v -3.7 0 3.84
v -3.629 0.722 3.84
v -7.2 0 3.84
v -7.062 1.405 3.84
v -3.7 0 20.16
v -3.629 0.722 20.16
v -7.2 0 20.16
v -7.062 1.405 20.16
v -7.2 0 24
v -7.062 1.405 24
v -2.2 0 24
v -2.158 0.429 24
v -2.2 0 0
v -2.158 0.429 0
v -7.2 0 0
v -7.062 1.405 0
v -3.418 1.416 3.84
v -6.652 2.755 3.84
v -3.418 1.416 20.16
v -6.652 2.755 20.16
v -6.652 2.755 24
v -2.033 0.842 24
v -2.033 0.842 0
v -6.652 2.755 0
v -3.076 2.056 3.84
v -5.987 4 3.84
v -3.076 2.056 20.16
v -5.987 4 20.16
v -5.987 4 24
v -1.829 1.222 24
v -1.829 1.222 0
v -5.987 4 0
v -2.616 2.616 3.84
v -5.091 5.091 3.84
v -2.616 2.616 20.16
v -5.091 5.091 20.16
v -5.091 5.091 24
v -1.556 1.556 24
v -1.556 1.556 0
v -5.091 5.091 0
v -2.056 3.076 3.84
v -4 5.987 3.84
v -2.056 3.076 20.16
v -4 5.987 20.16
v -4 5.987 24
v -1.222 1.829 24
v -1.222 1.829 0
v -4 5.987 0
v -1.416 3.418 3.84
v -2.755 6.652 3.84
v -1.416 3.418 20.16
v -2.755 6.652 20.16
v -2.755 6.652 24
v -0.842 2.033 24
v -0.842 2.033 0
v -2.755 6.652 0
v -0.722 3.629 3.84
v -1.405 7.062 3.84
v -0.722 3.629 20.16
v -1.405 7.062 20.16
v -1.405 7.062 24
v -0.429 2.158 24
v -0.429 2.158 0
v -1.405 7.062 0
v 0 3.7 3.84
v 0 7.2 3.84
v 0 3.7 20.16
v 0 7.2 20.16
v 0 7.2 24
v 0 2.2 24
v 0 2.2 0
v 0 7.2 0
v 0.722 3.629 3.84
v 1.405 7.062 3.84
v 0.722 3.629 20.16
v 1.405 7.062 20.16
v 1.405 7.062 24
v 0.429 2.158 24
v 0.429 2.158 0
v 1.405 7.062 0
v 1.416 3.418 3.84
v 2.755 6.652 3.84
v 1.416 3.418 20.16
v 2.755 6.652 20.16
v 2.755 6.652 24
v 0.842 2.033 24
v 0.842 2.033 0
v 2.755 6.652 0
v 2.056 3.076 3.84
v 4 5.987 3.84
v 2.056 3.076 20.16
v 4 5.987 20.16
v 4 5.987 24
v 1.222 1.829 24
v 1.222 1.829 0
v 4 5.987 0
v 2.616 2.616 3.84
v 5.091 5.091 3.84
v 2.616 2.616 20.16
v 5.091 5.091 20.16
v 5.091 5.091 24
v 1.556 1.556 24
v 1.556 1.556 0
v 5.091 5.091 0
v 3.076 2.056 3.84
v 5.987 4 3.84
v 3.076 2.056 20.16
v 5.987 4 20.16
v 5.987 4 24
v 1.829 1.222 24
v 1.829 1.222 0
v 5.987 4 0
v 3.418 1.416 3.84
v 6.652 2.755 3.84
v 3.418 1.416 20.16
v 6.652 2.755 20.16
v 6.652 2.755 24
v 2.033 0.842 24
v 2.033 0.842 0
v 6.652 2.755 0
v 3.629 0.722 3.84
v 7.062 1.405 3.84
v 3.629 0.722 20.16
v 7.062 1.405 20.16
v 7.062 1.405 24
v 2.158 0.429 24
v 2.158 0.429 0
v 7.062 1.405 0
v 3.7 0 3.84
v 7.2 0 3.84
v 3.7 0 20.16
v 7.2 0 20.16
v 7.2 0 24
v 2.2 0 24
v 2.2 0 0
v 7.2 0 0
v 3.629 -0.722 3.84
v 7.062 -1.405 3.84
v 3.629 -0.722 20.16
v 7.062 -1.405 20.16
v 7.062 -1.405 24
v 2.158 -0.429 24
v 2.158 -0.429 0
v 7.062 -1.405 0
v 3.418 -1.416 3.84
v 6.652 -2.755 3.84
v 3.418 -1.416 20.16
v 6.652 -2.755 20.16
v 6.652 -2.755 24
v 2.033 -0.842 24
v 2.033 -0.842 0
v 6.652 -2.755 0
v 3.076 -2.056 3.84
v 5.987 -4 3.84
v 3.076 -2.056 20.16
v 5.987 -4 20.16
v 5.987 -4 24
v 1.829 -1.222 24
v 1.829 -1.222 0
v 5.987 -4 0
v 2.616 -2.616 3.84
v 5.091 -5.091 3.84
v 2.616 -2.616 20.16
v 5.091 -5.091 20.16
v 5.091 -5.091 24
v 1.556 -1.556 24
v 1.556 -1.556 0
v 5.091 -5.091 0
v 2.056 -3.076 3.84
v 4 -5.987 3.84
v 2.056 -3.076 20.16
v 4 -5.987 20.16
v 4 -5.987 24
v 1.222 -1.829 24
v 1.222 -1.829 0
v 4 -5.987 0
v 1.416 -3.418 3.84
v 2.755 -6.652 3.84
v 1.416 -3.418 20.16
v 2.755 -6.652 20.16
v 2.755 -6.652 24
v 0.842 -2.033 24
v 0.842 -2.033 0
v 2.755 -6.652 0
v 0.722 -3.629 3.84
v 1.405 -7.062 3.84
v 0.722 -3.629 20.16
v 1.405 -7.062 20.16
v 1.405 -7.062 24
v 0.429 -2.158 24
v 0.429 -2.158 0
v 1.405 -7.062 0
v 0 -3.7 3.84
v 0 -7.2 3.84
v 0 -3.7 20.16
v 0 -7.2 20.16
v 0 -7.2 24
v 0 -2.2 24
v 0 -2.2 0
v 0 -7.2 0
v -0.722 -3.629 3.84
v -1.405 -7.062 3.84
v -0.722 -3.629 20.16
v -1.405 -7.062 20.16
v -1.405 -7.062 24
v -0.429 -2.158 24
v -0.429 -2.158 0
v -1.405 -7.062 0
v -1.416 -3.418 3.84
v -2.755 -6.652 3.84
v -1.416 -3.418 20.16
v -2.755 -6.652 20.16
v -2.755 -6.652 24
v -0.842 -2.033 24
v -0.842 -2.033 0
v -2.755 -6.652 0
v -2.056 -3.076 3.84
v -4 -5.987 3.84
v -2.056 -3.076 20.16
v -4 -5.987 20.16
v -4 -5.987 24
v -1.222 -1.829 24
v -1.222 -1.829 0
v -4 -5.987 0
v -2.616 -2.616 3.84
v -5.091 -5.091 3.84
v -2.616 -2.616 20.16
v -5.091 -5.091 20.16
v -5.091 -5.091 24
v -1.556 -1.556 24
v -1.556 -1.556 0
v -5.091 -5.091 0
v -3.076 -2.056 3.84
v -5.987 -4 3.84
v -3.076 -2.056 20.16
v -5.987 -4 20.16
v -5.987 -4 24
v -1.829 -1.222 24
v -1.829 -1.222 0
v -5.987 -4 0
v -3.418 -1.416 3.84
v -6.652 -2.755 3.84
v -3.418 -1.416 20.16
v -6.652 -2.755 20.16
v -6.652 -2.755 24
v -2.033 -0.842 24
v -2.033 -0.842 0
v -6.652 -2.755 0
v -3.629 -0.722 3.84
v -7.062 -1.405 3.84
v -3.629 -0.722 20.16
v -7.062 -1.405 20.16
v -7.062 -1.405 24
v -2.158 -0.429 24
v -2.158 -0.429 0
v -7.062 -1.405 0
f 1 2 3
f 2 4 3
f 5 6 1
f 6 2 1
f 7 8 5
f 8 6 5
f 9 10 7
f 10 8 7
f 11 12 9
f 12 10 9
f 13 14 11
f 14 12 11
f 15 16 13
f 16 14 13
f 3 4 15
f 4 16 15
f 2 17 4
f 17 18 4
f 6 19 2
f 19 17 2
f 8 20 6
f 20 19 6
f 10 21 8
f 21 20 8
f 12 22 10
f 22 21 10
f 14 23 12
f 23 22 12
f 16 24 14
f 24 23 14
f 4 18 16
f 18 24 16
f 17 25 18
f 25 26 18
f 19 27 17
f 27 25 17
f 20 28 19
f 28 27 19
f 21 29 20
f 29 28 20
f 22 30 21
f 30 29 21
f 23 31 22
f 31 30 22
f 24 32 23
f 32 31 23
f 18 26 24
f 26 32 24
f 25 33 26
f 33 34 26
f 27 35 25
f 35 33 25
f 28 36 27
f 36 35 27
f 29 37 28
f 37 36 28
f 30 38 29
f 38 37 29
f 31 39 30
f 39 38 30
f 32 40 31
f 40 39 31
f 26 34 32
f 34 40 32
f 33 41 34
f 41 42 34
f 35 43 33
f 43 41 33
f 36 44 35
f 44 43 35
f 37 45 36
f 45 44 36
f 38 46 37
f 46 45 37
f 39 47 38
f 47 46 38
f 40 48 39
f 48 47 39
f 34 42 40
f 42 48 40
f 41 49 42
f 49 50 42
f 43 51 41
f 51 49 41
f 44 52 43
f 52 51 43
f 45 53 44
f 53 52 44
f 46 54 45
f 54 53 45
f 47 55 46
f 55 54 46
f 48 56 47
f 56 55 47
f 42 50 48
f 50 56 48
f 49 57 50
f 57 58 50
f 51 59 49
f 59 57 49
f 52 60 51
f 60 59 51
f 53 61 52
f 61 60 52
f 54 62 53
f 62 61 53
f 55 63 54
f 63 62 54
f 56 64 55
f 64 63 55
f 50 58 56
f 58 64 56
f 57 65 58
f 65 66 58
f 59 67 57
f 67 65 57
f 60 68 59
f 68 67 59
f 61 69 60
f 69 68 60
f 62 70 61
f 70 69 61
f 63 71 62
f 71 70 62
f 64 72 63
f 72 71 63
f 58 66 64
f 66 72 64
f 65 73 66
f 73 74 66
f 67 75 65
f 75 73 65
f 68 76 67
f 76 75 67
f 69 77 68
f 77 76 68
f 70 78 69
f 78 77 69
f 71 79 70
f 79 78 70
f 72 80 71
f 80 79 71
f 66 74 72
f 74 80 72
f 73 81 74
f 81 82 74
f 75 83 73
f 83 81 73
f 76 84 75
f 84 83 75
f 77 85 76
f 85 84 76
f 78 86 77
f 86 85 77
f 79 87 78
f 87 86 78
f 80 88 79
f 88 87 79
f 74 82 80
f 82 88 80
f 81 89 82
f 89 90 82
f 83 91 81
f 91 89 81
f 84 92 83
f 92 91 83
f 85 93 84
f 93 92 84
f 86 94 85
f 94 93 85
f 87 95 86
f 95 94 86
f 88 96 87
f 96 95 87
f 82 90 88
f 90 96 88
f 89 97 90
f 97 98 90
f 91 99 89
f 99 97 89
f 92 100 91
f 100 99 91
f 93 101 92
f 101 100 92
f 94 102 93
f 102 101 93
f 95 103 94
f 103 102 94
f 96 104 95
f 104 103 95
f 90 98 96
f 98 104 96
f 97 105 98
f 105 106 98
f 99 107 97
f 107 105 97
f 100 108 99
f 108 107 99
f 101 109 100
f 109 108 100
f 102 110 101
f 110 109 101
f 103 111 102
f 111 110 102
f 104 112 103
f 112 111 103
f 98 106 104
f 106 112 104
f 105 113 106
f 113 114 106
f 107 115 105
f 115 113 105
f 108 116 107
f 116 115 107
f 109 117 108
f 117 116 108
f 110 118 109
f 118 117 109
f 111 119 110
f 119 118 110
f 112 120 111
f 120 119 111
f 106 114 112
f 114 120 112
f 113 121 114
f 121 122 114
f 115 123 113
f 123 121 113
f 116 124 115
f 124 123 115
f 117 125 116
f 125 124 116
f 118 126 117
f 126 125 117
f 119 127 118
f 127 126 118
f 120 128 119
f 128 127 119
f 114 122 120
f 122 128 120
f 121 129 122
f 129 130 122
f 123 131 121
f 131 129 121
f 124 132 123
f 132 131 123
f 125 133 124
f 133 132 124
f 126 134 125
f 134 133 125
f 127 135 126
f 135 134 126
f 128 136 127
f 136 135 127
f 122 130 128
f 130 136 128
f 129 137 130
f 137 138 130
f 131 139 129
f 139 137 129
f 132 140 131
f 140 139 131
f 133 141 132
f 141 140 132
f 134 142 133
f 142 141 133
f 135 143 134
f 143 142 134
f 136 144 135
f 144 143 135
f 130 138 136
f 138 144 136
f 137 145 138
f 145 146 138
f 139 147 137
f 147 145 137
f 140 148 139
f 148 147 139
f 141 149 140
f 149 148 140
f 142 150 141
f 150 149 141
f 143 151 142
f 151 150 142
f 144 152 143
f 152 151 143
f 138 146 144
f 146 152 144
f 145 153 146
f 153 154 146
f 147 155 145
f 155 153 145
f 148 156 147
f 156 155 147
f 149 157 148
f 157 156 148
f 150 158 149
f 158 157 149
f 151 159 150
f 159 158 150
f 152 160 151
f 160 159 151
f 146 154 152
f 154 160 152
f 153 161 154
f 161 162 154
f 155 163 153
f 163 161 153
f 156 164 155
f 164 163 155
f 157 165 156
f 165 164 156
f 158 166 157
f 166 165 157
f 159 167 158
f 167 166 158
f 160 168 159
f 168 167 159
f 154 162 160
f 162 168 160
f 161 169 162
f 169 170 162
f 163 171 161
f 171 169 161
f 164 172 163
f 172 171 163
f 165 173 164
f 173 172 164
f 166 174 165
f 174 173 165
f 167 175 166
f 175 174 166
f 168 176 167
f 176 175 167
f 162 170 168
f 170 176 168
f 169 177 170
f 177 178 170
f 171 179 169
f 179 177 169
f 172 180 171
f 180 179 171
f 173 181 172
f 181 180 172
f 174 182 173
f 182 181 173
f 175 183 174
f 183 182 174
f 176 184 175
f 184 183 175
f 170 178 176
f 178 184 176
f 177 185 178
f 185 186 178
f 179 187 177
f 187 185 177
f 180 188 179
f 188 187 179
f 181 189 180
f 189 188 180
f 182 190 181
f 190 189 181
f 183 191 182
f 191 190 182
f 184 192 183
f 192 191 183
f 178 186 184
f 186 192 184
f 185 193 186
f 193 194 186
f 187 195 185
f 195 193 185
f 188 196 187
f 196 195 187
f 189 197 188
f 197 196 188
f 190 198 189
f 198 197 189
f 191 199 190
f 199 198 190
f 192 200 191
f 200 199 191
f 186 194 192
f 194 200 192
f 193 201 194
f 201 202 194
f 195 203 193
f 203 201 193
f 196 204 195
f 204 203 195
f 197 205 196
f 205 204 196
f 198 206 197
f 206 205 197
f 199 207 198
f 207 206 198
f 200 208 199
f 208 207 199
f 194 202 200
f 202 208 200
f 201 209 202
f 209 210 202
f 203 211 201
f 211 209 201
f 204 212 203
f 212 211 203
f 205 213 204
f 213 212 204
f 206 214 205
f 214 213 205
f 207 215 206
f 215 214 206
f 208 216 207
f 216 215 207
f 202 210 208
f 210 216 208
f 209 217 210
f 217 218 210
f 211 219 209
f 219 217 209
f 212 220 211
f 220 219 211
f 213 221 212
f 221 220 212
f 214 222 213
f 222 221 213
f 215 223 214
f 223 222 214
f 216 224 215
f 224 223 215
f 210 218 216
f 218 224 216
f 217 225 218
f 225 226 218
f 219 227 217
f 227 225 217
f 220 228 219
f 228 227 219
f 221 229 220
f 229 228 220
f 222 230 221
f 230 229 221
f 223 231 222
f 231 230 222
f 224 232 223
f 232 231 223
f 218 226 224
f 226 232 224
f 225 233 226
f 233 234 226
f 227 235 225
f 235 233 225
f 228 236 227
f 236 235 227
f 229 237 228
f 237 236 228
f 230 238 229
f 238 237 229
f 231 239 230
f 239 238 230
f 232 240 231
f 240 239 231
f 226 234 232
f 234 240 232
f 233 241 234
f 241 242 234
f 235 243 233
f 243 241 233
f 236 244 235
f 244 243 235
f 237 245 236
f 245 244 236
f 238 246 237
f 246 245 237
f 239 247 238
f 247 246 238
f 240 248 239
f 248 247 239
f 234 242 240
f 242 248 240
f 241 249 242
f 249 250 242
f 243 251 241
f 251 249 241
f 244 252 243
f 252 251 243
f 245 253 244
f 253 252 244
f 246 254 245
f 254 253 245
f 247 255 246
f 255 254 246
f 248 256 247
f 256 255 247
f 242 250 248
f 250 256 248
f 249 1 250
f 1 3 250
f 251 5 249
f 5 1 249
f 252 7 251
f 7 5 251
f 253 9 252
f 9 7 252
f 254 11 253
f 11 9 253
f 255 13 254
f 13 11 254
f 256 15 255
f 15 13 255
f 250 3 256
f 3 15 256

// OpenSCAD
$fn = 32;

// ----------------------------------------------------------------------
// Profiled standoff: spool spacer, 24 mm long, bore 4.4 mm
// ----------------------------------------------------------------------

// --- parameters (mm) ---
revolve_angle = 360;      // full turn around the Z axis
profile_points = 8;       // points of the closed outline

profile = [[2.2, 0], [7.2, 0], [7.2, 3.84], [3.7, 3.84], [3.7, 20.16], [7.2, 20.16], [7.2, 24], [2.2, 24]];  // single closed polygon, 8 points, counter clockwise

// --- the one profile operation ---
rotate_extrude(angle = revolve_angle) polygon(points = profile);
